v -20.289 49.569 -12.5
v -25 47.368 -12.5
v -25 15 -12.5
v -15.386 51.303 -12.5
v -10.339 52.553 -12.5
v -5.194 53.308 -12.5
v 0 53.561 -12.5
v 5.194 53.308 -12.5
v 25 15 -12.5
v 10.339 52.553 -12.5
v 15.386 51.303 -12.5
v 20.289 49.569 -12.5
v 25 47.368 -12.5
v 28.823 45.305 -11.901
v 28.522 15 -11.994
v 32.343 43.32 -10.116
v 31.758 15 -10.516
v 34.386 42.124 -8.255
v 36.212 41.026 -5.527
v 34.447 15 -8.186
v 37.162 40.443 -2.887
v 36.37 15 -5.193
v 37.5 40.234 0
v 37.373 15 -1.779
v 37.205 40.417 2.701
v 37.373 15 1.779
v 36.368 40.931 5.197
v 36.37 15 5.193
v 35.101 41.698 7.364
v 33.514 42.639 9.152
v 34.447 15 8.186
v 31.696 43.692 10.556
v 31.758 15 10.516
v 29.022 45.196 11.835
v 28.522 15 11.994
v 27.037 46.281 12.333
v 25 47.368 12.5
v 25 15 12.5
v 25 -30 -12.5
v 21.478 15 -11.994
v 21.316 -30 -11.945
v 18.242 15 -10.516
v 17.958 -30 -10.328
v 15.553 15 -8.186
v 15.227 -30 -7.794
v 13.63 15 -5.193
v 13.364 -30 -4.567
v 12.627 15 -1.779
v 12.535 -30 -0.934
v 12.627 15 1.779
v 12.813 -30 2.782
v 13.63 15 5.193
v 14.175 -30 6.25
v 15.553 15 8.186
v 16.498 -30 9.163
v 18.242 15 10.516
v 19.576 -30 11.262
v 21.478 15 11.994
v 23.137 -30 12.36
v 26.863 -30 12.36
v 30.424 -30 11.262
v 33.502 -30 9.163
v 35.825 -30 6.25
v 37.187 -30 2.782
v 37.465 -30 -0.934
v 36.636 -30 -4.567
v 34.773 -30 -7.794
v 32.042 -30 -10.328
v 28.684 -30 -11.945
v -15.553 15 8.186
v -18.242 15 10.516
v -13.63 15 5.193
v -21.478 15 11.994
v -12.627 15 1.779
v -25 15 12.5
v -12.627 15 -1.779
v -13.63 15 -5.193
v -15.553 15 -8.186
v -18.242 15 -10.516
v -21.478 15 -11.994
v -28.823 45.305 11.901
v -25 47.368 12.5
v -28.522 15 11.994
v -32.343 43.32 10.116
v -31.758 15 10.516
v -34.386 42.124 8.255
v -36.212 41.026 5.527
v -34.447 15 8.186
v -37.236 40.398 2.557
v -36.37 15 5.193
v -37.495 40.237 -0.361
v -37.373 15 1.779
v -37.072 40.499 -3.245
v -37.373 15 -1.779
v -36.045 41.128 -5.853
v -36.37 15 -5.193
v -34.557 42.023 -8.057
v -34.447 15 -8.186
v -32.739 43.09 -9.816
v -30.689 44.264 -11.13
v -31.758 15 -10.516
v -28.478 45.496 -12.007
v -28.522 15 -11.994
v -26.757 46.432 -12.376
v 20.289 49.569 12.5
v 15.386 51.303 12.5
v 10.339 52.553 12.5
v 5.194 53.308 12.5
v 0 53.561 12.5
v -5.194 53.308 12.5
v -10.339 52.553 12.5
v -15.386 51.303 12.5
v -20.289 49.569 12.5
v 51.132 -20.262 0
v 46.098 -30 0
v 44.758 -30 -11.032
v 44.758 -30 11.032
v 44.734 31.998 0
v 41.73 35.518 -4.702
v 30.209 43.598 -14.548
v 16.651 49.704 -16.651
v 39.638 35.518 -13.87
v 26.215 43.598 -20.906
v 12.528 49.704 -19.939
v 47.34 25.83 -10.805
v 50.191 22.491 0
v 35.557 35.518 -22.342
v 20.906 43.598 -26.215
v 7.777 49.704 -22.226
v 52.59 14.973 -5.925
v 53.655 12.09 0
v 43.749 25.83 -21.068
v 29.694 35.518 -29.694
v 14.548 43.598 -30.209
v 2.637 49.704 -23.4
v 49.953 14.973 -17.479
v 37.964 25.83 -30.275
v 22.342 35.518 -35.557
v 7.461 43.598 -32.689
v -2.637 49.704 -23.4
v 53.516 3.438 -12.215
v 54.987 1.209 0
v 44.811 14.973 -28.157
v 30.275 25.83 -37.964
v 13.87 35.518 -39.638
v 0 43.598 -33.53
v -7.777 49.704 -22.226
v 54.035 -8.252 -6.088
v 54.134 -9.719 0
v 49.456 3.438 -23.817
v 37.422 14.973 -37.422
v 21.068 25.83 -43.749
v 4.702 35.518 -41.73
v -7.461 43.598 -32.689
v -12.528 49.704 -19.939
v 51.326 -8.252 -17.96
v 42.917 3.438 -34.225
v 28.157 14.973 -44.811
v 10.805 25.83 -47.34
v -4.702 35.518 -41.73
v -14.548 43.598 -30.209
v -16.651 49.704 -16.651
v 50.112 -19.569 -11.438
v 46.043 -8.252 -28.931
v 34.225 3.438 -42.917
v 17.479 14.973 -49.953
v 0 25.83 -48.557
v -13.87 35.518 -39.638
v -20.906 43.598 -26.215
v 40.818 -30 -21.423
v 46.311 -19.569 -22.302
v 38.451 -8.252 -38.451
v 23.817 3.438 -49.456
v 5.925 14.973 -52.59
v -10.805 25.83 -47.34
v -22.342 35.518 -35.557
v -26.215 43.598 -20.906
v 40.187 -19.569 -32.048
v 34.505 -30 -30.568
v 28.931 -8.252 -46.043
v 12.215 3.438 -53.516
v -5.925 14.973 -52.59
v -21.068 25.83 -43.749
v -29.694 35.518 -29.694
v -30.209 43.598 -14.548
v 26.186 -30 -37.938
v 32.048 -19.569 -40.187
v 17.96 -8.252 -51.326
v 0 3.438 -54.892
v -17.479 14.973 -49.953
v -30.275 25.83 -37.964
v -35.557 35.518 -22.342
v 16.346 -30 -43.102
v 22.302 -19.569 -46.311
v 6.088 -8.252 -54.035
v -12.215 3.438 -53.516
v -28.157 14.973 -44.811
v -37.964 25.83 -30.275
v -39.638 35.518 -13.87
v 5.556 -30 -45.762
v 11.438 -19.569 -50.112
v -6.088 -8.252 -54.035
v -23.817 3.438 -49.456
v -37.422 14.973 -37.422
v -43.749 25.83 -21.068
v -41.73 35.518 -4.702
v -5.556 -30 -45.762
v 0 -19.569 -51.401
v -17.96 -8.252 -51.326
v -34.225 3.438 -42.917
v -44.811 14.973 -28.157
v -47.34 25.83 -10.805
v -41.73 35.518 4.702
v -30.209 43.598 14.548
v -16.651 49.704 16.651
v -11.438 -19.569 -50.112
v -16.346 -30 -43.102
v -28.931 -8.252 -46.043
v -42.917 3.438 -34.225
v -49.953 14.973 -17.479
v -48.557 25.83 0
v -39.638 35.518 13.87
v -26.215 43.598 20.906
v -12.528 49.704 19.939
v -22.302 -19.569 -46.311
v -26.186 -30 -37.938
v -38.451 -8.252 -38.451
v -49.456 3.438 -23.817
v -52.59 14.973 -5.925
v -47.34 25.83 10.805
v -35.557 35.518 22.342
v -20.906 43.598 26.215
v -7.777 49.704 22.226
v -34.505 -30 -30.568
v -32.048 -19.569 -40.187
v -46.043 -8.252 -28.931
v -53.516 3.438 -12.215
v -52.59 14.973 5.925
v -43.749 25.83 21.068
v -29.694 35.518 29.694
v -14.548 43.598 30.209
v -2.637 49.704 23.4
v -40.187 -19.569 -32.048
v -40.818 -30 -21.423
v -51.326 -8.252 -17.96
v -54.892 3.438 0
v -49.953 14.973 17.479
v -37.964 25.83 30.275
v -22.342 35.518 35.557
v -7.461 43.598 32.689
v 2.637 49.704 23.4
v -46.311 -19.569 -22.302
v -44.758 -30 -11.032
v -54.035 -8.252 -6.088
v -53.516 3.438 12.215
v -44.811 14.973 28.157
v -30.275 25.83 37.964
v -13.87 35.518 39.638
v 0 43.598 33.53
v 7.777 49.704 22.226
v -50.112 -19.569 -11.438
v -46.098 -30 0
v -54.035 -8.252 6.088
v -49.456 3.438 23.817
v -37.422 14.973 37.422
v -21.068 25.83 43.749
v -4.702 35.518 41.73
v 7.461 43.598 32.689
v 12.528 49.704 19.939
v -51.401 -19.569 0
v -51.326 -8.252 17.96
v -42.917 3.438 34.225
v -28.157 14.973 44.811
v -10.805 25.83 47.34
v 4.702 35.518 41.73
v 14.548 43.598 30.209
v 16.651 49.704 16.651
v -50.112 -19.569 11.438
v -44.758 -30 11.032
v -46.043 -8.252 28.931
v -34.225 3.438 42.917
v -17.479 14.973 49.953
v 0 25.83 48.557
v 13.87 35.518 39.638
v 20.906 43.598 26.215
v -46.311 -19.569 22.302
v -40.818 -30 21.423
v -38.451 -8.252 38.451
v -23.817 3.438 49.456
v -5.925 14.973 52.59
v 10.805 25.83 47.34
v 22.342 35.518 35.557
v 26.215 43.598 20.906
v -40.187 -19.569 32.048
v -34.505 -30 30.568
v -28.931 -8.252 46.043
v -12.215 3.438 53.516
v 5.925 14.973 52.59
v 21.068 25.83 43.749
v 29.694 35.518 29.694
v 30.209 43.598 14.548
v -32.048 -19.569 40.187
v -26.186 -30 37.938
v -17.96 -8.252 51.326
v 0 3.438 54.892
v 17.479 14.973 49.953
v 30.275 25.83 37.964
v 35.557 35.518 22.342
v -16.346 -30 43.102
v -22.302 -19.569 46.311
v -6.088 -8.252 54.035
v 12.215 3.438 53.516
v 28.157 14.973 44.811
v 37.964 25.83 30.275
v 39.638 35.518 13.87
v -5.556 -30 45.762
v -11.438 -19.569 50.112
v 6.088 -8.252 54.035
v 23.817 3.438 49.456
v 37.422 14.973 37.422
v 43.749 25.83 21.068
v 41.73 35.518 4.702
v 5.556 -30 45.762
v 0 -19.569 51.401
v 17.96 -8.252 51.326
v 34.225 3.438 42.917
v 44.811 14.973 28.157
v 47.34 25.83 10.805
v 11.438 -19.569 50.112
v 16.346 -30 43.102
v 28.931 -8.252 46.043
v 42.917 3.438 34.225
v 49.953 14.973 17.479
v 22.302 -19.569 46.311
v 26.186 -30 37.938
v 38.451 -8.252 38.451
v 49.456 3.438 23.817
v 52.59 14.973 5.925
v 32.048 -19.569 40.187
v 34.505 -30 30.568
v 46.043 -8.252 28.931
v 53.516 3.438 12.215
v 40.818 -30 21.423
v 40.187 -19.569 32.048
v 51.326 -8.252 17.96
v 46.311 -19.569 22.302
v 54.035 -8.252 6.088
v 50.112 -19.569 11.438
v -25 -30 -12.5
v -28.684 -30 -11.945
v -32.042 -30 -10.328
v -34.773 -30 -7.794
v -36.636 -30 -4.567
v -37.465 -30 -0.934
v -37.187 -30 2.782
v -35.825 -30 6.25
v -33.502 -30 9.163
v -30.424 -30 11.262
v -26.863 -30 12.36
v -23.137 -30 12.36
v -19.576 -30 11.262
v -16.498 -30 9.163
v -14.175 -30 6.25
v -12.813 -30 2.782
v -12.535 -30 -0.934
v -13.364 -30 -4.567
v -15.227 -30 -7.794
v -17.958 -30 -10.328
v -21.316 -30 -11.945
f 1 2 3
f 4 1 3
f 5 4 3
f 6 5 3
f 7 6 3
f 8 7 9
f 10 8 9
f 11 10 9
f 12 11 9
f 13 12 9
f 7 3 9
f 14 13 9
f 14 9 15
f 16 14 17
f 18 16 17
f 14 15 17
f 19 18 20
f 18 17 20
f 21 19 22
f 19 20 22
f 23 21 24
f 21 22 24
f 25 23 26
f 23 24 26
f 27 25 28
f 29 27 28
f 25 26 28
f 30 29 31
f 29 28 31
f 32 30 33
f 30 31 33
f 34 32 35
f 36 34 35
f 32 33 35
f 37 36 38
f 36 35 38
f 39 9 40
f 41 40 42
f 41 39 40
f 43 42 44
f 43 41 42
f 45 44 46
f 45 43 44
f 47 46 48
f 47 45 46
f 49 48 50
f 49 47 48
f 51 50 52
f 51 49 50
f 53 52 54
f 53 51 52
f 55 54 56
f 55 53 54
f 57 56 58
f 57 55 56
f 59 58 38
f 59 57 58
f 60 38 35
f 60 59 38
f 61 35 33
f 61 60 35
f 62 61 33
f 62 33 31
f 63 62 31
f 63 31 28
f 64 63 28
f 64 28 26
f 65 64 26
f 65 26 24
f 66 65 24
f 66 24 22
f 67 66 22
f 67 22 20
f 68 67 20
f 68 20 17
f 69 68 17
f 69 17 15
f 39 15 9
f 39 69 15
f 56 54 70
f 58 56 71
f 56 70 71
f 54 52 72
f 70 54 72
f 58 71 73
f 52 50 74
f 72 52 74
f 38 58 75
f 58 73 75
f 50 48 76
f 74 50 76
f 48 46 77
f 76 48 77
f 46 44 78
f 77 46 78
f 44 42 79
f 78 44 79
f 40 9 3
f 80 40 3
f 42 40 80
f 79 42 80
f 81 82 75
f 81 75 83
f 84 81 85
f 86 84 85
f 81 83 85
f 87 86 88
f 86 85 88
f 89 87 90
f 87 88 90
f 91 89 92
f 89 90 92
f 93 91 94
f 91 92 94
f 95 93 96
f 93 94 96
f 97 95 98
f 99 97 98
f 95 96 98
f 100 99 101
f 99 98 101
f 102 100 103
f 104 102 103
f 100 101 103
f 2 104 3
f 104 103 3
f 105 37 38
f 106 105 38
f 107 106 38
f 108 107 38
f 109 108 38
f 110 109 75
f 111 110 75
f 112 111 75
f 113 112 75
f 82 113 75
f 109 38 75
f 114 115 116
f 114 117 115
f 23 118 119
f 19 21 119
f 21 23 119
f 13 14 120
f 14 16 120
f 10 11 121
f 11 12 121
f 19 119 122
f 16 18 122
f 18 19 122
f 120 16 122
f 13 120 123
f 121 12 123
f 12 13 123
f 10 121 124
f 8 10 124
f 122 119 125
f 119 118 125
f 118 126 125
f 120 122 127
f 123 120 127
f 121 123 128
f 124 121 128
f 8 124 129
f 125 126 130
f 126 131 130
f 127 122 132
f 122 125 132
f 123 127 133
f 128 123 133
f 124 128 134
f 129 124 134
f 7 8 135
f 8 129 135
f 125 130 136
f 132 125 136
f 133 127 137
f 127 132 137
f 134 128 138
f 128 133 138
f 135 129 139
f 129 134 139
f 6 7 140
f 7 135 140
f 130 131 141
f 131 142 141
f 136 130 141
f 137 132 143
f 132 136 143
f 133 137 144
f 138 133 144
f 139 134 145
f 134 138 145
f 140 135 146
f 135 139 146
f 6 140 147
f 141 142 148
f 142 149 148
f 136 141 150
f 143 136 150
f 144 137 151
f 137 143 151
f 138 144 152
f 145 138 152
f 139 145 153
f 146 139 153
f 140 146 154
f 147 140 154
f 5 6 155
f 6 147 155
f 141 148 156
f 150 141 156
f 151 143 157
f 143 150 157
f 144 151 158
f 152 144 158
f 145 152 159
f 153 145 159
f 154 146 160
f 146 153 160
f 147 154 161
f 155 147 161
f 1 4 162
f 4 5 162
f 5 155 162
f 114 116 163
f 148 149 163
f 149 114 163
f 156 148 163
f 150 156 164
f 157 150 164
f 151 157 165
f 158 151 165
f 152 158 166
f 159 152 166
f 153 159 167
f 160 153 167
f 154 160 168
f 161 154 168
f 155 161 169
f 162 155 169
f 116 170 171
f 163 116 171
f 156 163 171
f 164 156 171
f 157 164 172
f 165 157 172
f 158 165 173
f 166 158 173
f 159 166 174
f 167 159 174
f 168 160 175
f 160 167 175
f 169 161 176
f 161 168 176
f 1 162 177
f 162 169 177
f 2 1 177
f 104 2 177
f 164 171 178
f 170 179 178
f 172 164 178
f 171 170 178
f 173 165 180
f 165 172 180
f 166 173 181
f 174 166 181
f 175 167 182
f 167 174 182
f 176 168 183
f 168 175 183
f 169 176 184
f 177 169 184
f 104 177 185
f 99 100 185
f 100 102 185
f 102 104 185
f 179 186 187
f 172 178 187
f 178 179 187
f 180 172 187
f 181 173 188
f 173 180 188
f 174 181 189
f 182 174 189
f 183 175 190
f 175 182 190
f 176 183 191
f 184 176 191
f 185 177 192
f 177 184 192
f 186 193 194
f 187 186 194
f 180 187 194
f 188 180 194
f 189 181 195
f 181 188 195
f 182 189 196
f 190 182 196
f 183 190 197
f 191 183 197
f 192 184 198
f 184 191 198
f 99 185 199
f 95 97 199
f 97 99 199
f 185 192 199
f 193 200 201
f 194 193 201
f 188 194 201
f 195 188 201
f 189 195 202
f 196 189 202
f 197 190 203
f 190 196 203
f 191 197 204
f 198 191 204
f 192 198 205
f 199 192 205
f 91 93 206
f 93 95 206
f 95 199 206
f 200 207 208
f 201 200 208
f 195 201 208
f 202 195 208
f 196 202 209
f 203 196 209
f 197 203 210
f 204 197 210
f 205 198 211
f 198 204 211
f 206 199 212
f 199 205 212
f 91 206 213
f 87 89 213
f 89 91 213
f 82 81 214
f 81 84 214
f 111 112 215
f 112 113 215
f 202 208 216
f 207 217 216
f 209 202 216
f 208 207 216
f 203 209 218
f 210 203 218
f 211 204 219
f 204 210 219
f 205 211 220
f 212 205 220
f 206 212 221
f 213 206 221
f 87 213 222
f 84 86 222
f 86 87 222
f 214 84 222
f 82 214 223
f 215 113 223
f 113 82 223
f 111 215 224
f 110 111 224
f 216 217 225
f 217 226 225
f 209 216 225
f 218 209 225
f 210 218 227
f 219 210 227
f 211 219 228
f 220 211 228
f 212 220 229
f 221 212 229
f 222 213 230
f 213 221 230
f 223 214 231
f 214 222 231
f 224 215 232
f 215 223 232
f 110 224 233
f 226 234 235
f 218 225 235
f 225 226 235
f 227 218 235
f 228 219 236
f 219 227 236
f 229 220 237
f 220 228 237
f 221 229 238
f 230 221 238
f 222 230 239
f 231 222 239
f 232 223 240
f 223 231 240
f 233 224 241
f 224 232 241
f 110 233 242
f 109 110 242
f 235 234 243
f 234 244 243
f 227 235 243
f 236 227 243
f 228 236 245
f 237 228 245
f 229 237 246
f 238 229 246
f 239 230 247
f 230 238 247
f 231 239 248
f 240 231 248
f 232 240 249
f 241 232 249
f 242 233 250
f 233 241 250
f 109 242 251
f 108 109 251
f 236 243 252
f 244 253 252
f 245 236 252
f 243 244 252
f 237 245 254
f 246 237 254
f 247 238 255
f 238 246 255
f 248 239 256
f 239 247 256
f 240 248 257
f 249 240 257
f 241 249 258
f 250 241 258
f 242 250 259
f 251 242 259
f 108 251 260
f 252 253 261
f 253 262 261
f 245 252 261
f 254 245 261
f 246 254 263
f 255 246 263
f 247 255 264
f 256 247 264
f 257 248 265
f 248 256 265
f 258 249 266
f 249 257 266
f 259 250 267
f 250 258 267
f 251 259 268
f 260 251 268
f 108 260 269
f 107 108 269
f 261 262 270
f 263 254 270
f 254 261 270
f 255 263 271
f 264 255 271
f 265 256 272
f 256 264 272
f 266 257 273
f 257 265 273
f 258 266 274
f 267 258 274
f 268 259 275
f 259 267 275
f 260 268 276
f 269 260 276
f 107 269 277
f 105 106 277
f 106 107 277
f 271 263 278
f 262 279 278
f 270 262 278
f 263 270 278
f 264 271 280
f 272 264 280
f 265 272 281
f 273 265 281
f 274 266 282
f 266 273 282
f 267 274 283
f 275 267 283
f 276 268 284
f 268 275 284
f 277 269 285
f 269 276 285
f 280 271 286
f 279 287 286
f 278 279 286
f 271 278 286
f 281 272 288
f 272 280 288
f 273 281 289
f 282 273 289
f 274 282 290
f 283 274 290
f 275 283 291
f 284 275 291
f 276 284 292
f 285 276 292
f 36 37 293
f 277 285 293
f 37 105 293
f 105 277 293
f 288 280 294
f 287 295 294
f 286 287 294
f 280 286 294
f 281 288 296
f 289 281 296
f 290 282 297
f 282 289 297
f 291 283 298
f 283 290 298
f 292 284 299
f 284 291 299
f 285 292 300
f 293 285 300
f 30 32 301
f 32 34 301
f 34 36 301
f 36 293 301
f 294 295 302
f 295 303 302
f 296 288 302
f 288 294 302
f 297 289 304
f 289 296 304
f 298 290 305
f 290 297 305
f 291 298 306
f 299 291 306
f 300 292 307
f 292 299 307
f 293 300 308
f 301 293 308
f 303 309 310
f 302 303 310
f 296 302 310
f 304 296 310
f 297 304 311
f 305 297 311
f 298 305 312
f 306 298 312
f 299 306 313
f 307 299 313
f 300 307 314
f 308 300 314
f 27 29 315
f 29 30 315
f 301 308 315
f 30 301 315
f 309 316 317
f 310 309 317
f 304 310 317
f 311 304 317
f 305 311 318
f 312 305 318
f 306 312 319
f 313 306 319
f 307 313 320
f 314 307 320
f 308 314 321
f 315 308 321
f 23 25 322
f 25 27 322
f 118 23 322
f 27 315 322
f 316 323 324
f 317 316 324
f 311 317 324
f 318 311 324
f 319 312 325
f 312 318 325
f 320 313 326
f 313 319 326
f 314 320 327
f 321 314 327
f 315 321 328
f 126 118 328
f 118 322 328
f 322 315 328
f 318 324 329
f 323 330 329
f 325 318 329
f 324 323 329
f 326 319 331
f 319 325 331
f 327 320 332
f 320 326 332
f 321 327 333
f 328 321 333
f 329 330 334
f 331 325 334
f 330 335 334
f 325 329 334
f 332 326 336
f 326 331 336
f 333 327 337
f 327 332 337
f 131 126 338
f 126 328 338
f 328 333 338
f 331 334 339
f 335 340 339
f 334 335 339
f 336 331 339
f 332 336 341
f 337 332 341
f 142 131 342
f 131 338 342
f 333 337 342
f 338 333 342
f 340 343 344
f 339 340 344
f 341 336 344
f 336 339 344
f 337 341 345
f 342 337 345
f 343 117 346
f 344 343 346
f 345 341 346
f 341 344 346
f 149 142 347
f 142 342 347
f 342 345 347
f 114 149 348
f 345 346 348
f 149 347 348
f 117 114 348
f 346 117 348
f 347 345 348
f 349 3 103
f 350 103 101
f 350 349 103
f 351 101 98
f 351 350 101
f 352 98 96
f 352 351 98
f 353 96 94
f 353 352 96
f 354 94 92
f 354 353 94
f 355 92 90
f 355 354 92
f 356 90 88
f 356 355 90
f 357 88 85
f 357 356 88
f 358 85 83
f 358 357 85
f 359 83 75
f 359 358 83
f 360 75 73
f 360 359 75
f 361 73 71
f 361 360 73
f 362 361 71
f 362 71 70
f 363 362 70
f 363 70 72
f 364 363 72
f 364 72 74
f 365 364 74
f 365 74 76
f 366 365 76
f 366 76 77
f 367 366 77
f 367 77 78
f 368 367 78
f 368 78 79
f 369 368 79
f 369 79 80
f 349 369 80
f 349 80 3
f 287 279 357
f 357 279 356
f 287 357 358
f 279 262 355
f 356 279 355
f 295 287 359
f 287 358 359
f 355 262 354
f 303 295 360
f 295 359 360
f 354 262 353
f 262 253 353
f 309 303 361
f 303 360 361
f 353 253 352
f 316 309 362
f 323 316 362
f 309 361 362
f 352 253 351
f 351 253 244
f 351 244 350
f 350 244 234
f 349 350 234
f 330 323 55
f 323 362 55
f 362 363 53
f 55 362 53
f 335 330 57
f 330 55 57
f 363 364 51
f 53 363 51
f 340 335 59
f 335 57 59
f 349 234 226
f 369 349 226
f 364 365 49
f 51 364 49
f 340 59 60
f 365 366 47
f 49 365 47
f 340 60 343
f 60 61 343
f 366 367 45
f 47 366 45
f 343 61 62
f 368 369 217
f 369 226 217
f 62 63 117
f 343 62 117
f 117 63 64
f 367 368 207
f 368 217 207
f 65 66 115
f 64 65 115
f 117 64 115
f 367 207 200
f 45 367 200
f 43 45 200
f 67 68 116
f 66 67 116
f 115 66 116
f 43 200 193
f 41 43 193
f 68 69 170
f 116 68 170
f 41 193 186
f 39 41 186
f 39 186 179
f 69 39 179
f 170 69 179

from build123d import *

# Parameters (mm, degrees)
CUT_EXTRUDE4_START = 15
CUT_EXTRUDE4_DEPTH = 80
CUT_EXTRUDE6_START = -65
SKETCH6_R          = 12.5
CUT_EXTRUDE6_DEPTH = 80


with BuildPart() as part:
    # Sketch1 → Revolve1 (revolve)
    with BuildSketch(Plane.XY):
        with BuildLine():
            Line((46.097722286, -30), (0, -30))
            Line((0, -30), (0, 55))
            ThreePointArc((0, 55), (48.347699015, 26.220221204), (46.097722286, -30))
        make_face()
    revolve(axis=Axis((0, 4.730452026, 0), (0, 1, 0)))

    # Sketch3 → Cut-Extrude4 (cut)
    with BuildSketch(Plane(origin=(0, 0, 0), x_dir=(1, 0, 0), z_dir=(0, 1, 0)).offset(CUT_EXTRUDE4_START)):
        with BuildLine():
            Line((-25, 12.5), (25, 12.5))
            ThreePointArc((25, 12.5), (37.5, 0), (25, -12.5))
            Line((25, -12.5), (-25, -12.5))
            ThreePointArc((-25, -12.5), (-37.5, 0), (-25, 12.5))
        make_face()
    extrude(amount=CUT_EXTRUDE4_DEPTH, mode=Mode.SUBTRACT)

    # Sketch6 → Cut-Extrude6 (cut)
    with BuildSketch(Plane(origin=(0, 0, 0), x_dir=(1, 0, 0), z_dir=(0, 1, 0)).offset(CUT_EXTRUDE6_START)):
        with Locations((-25, 0)):
            Circle(SKETCH6_R)
        with Locations((25, 0)):
            Circle(SKETCH6_R)
    extrude(amount=CUT_EXTRUDE6_DEPTH, mode=Mode.SUBTRACT)


solid = part.part
